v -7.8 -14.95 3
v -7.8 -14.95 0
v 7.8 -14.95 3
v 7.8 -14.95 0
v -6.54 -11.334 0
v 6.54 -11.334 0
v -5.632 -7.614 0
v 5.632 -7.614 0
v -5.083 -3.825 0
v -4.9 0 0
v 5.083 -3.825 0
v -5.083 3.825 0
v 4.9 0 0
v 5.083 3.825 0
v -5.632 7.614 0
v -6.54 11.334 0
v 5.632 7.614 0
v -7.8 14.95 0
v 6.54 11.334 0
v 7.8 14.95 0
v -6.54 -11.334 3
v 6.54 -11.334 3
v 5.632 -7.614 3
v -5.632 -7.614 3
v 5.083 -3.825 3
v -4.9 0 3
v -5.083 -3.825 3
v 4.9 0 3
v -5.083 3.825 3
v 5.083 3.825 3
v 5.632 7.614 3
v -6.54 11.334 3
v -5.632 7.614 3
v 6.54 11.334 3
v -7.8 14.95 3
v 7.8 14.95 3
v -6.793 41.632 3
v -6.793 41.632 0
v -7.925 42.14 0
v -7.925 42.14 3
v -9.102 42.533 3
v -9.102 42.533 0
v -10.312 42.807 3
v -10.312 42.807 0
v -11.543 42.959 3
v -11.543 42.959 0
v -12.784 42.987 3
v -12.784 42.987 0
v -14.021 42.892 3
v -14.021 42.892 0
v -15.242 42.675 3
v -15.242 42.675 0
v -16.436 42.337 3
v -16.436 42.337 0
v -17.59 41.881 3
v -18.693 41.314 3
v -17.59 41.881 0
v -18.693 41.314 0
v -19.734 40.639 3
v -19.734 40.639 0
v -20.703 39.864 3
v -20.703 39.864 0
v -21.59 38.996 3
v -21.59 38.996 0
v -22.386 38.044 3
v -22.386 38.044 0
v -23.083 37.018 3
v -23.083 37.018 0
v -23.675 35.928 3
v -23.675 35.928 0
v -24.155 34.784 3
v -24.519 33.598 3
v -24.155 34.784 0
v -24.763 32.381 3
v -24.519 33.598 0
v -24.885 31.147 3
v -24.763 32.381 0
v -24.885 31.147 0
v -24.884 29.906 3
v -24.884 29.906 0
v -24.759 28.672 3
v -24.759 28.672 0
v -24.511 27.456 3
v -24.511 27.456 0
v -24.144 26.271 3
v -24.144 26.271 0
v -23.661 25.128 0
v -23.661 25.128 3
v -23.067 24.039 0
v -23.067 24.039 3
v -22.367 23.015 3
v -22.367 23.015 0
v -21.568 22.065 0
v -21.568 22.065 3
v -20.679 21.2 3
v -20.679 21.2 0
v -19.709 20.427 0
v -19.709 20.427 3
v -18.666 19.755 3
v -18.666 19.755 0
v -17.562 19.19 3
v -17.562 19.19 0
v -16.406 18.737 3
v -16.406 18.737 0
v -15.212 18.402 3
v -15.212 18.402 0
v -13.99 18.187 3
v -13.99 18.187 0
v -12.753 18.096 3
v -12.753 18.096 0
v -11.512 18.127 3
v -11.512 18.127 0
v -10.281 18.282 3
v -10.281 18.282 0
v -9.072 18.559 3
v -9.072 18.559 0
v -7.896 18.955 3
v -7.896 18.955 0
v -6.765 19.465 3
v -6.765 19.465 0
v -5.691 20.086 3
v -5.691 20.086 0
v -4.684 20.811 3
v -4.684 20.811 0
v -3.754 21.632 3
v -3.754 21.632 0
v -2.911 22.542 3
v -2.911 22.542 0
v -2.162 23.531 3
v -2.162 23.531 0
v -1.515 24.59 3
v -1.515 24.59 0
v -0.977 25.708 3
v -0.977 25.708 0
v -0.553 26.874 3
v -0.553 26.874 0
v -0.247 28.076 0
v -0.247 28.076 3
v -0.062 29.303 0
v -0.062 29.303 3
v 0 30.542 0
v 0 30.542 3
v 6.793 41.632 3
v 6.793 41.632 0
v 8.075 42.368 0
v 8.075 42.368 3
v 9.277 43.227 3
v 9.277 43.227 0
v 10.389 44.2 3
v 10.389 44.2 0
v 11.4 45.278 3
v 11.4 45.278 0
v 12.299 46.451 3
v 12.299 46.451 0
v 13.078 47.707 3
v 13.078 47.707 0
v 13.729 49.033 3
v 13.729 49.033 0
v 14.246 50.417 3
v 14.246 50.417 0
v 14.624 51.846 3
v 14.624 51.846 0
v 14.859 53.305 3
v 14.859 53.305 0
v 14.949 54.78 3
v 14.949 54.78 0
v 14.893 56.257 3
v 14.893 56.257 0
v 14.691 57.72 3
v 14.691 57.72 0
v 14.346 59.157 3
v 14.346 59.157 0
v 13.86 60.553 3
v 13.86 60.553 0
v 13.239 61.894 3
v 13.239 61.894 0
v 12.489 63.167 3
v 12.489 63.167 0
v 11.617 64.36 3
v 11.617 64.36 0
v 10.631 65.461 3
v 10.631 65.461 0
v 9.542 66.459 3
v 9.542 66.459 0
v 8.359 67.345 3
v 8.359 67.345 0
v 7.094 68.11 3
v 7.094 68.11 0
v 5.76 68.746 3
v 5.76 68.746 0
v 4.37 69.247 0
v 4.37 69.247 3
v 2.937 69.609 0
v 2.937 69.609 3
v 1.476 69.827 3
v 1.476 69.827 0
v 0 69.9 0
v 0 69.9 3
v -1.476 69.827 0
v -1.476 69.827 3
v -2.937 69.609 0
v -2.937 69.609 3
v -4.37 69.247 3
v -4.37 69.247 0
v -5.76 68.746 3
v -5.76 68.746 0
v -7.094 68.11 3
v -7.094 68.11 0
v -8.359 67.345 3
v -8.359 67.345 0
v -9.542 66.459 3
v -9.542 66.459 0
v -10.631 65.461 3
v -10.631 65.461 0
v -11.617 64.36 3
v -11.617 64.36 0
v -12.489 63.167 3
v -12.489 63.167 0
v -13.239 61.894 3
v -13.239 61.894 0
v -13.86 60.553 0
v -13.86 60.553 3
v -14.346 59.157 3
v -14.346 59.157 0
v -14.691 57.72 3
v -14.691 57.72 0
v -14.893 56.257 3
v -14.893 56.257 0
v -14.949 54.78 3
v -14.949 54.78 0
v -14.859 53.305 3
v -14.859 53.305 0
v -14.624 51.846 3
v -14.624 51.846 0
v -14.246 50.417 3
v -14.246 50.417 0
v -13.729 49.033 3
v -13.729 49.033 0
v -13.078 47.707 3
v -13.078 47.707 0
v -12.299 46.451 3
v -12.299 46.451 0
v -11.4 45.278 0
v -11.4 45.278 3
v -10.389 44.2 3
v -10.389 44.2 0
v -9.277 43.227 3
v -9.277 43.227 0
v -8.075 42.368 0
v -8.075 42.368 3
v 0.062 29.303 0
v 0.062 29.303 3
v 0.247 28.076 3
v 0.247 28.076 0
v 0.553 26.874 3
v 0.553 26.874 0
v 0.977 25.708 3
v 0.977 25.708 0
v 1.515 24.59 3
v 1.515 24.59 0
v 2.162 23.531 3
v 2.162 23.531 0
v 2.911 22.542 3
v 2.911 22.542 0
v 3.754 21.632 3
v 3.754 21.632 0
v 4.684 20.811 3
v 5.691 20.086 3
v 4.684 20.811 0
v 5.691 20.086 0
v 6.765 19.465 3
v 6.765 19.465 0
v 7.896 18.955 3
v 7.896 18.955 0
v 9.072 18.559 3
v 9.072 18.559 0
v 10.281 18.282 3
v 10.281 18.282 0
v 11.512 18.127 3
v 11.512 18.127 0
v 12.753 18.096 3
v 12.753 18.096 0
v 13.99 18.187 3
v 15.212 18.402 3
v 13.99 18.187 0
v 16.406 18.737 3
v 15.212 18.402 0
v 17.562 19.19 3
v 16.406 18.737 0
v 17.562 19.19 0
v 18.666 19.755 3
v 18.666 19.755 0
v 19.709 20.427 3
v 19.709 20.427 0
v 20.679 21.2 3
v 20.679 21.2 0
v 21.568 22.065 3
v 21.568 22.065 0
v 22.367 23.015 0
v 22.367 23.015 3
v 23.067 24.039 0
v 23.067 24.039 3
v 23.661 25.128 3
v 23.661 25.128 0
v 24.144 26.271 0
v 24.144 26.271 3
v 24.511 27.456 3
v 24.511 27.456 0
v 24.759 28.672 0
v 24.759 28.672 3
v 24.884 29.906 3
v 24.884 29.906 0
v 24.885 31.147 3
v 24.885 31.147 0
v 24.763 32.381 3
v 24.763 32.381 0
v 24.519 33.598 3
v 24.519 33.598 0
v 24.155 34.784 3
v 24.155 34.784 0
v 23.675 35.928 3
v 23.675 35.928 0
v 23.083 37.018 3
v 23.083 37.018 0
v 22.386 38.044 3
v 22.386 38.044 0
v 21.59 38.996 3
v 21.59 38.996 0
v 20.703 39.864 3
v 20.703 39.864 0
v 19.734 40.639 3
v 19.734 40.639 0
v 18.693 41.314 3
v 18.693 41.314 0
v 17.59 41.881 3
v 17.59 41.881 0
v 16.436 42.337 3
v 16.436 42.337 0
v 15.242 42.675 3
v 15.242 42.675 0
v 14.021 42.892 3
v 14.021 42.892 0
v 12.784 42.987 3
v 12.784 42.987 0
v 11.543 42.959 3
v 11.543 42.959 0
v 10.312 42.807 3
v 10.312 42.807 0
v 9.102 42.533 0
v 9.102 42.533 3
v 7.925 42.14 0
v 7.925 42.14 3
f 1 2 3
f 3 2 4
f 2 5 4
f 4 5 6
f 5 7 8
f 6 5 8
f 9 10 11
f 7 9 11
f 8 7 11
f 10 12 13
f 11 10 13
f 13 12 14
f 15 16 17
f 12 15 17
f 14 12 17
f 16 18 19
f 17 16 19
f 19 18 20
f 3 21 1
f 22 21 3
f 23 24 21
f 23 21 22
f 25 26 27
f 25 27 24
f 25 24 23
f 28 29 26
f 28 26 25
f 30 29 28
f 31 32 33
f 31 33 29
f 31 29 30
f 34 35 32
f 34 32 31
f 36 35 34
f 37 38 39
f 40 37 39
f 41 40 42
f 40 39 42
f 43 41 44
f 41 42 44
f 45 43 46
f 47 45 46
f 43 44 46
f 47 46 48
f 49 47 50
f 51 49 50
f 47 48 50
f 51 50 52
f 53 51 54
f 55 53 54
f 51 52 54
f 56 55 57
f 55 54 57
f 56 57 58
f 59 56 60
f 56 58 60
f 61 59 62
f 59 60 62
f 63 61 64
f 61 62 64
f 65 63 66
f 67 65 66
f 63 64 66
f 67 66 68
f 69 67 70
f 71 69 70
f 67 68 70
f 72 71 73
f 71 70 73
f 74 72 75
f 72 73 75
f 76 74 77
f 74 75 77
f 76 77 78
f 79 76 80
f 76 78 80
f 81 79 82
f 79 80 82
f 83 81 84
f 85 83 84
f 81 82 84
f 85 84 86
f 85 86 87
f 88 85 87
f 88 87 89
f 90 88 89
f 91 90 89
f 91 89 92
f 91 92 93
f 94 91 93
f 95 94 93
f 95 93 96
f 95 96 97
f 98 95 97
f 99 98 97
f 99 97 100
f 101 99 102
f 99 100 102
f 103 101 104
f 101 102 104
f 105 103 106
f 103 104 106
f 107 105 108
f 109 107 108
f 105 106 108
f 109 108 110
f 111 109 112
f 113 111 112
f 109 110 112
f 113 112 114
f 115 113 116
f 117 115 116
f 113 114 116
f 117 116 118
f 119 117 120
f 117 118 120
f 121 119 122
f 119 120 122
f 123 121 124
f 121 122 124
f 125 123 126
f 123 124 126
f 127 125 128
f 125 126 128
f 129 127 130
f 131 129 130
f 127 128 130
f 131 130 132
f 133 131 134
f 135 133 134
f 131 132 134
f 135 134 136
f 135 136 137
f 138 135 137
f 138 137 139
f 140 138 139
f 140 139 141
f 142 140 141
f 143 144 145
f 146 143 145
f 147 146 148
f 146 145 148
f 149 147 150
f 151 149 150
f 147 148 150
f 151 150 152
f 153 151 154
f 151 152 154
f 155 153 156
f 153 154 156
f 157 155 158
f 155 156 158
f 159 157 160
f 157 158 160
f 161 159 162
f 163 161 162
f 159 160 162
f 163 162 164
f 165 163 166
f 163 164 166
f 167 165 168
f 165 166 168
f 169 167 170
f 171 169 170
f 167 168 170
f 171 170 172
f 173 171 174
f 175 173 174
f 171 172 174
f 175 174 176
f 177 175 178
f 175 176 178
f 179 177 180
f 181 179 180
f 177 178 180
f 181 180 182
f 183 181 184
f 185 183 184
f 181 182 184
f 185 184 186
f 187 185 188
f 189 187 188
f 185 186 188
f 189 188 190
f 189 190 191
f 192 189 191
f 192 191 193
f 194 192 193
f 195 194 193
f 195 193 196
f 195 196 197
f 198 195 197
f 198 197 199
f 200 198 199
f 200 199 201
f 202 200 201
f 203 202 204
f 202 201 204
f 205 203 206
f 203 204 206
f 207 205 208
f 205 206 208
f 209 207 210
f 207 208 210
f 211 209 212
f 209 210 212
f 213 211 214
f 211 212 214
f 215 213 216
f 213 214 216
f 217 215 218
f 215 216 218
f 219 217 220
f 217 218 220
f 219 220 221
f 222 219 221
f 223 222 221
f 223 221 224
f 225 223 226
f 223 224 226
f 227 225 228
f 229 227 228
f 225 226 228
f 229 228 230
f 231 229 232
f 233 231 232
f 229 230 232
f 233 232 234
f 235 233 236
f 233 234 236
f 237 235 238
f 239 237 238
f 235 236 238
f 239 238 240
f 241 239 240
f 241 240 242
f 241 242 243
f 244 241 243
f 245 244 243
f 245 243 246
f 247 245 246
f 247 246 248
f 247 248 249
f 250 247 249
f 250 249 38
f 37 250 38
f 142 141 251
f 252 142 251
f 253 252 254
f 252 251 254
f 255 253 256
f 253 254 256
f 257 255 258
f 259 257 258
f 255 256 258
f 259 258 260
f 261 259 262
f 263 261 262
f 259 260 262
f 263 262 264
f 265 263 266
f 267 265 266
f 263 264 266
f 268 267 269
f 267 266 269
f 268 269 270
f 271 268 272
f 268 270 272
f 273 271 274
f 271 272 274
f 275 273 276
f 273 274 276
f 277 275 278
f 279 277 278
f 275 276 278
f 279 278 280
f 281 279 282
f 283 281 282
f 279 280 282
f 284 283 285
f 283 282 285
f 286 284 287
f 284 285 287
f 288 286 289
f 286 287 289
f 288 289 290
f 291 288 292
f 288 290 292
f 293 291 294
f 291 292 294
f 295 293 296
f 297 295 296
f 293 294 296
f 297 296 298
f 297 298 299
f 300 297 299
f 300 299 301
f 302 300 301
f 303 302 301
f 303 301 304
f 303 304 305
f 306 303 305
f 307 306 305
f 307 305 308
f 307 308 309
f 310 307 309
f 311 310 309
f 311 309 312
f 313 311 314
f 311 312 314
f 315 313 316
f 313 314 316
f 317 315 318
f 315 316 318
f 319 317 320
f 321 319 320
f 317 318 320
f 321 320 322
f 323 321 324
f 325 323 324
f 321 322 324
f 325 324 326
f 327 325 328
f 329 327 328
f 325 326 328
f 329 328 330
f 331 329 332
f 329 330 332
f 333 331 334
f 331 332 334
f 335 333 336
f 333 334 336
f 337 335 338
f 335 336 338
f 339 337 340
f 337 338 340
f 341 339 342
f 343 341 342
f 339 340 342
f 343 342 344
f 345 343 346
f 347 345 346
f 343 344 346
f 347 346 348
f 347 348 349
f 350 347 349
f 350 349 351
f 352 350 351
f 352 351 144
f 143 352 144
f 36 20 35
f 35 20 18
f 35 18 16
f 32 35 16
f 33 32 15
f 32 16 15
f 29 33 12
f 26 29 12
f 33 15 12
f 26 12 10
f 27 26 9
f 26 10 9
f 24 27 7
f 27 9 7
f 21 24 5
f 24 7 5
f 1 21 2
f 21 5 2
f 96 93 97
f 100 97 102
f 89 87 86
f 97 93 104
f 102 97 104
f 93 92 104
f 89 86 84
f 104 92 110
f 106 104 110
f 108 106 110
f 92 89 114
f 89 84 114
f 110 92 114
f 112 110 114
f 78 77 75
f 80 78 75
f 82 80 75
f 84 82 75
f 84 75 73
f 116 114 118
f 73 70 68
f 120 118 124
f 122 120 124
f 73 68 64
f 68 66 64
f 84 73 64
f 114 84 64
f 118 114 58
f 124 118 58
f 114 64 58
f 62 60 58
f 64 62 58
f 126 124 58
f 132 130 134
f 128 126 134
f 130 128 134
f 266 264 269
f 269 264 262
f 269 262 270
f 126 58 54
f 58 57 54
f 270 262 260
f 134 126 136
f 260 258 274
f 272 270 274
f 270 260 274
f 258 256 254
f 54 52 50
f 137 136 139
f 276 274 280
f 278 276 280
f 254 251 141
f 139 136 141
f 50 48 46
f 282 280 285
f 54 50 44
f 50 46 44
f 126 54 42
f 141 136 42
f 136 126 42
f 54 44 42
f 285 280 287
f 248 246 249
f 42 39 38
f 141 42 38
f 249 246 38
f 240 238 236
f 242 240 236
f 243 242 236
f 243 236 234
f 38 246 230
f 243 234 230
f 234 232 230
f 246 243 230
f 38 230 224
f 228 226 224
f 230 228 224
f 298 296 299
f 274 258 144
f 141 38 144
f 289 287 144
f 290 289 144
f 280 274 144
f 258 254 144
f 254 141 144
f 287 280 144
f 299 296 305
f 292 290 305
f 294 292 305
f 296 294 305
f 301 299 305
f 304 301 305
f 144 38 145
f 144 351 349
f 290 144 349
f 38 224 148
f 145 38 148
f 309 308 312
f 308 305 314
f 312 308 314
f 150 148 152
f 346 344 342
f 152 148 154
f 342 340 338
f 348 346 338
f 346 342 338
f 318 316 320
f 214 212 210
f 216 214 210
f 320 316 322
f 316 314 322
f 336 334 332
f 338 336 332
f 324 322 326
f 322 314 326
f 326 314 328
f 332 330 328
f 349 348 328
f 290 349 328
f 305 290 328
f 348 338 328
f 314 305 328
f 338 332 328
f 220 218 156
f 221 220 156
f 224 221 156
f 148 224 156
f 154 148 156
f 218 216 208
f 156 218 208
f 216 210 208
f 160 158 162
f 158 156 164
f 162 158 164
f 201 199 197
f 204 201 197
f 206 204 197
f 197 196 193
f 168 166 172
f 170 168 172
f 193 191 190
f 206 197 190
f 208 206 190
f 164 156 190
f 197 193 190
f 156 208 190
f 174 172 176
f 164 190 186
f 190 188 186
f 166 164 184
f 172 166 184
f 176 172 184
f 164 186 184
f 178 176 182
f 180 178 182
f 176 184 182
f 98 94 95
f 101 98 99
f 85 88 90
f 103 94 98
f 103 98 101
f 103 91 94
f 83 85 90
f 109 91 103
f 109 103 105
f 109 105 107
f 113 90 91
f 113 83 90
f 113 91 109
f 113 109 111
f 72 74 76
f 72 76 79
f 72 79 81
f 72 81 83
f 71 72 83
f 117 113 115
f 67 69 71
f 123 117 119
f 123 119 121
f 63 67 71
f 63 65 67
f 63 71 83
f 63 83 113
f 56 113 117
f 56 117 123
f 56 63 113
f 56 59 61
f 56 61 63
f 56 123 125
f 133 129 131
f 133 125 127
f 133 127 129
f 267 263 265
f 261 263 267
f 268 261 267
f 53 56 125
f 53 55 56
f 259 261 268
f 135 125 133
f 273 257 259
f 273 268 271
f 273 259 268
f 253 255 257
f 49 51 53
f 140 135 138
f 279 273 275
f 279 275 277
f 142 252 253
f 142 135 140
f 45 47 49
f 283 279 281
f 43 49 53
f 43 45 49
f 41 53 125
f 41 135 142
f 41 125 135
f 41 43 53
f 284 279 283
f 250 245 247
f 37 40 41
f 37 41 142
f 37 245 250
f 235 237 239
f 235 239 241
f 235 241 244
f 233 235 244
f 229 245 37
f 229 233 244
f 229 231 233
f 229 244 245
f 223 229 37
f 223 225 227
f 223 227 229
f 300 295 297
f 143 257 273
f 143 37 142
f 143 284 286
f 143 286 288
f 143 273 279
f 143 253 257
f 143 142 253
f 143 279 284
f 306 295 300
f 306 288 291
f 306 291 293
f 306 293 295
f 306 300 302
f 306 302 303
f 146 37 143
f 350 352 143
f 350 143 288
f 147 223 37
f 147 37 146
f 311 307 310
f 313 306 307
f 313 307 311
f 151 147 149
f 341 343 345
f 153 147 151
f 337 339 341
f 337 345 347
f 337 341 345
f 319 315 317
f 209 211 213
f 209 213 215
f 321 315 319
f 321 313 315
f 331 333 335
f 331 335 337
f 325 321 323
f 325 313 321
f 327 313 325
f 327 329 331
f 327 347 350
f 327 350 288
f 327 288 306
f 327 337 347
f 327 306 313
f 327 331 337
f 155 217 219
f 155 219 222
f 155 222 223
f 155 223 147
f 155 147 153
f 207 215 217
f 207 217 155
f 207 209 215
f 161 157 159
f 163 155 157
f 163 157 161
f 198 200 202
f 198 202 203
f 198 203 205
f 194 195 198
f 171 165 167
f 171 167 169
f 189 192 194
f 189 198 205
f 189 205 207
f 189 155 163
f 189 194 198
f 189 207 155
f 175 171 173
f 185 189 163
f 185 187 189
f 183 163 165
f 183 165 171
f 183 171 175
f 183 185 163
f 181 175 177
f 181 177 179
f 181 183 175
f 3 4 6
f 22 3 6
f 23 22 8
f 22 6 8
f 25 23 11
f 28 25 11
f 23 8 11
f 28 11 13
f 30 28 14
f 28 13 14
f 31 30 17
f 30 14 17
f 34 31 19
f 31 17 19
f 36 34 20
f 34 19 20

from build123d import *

# Parameters (mm, degrees)
BOSS_EXTRUDE2_DEPTH   = 3
BOSS_EXTRUDE2_2_DEPTH = 3


with BuildPart() as part:
    # Sketch1 → Boss-Extrude2 (new body)
    with BuildSketch(Plane.XY):
        with BuildLine():
            Line((7.8, 14.95), (-7.8, 14.95))
            ThreePointArc((-7.8, 14.95), (-4.9, 0), (-7.8, -14.95))
            Line((-7.8, -14.95), (7.8, -14.95))
            ThreePointArc((7.8, -14.95), (4.9, 0), (7.8, 14.95))
        make_face()
    extrude(amount=BOSS_EXTRUDE2_DEPTH)


with BuildPart() as body_2:
    # Sketch1 → Boss-Extrude2 2 (new body)
    with BuildSketch(Plane.XY):
        with BuildLine():
            ThreePointArc((6.792974735, 41.632417853), (0, 69.9), (-6.792974735, 41.632417853))
            ThreePointArc((-6.792974735, 41.632417853), (-23.066790112, 24.039066641), (0, 30.541855867))
            ThreePointArc((0, 30.541855867), (23.066790112, 24.039066641), (6.792974735, 41.632417853))
        make_face()
    extrude(amount=BOSS_EXTRUDE2_2_DEPTH)


solid = Compound([part.part, body_2.part])
